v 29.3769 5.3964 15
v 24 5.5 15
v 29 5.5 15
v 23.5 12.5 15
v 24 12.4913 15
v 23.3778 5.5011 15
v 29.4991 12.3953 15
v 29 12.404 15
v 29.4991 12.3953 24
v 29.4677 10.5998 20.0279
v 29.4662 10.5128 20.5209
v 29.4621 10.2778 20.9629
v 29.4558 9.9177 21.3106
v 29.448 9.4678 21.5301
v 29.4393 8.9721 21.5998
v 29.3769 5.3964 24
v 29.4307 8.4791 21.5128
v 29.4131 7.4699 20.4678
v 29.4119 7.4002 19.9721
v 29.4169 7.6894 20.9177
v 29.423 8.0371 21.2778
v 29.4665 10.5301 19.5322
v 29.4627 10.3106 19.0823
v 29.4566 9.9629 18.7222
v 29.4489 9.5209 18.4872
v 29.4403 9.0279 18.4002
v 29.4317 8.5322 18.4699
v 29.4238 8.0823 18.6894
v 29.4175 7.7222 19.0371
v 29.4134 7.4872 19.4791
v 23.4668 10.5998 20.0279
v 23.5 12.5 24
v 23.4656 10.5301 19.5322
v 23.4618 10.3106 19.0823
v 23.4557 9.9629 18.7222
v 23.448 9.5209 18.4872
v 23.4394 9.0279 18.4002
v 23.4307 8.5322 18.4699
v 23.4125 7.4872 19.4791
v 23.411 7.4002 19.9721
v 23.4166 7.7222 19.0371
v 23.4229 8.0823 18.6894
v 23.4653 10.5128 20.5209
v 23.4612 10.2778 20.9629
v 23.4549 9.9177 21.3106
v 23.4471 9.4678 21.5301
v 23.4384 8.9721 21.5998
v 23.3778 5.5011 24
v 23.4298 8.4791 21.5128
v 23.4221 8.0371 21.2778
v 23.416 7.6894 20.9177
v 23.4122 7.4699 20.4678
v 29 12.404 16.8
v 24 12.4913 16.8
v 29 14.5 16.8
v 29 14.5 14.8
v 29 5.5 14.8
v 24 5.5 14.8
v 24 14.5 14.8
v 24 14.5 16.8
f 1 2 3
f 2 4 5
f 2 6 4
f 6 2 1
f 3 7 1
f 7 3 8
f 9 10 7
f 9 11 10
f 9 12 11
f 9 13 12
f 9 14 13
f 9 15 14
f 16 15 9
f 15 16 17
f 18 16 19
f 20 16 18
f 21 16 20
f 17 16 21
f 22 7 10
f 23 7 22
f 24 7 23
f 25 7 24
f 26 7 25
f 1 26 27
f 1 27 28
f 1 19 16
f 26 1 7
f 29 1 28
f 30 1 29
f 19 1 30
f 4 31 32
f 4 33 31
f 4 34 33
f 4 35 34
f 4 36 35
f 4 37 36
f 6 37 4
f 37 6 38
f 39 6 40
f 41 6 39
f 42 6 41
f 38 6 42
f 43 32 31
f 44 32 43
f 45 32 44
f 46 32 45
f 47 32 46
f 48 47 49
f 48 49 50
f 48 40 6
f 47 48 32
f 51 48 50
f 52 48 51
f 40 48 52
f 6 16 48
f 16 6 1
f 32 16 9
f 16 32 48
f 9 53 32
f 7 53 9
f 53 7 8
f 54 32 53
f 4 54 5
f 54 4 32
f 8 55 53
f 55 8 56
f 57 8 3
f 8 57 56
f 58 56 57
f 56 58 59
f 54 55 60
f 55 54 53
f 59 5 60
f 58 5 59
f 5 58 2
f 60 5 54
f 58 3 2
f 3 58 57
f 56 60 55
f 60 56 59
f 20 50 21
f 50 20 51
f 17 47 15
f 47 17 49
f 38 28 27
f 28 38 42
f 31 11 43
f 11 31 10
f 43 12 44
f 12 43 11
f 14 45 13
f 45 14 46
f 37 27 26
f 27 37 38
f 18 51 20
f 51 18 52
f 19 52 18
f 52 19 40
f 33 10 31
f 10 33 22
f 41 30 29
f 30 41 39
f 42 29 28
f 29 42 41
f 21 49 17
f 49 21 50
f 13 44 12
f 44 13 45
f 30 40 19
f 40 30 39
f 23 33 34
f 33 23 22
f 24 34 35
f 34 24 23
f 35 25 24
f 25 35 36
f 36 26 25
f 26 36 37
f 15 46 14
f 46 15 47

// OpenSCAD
rotate([180,0,0]){difference(){
    
    
union(){
linear_extrude(height = 3, center = false, convexity = 10, $fn=100)
   import (file = "5015housing-MK3.dxf", layer = "Base");
   
  translate([0,0, -7])linear_extrude(height = 10, center = false, convexity = 10, $fn=150)
  import (file = "5015housing-MK3.dxf", layer = "pillar");
   
    
    
   translate([0,0, -14])linear_extrude(height = 14, center = false, convexity = 10, $fn=150)
   import (file = "5015housing-MK3.dxf", layer = "Funnel");
    
    translate([0,0, -15])linear_extrude(height = 1.5, center = false, convexity = 10, $fn=150)
   import (file = "5015housing-MK3.dxf", layer = "Top");
    
    
   // translate([0,0, -9])linear_extrude(height = 9, center = false, convexity = 10, $fn=200)
   //import (file = "5015housing-MK3.dxf", layer = "Pins");
    
}

 //translate([0,0, -10])linear_extrude(height = 10, center = false, convexity = 10, $fn=200)
   //import (file = "5015housing-MK3.dxf", layer = "holes");

 translate([0,0, -5])linear_extrude(height = 10, center = false, convexity = 10, $fn=150)
   import (file = "5015housing-MK3.dxf", layer = "Holes-thru");

 translate([0,0, -7])linear_extrude(height = 0.8, center = false, convexity = 10, $fn=150)
   import (file = "5015housing-MK3.dxf", layer = "Ziptie-cutout");

translate([-36,-12.5+4+6.2,5])rotate([12.5,100,0])rotate([0,0,1])cylinder(r=1.65, h=38, $fn=20);
translate([-36,-12.5+4+6.2,5.1])rotate([12.5,100,0])rotate([0,0,1])cylinder(r=1.65, h=38, $fn=20);

}
difference(){
    union(){
translate([29-3-0.5-2,-12.5,-22-2])rotate([0,0,1])cube([6,7,9]);
    translate([29-3-2,-12.5-2,-22+5.2])cube([5,9,2]);
    }
translate([20,-12.5+3.5,-22+3.5-2+0.5])rotate([0,90,0])rotate([0,0,1])cylinder(r=1.6, h=20, $fn=20);


    
}}
